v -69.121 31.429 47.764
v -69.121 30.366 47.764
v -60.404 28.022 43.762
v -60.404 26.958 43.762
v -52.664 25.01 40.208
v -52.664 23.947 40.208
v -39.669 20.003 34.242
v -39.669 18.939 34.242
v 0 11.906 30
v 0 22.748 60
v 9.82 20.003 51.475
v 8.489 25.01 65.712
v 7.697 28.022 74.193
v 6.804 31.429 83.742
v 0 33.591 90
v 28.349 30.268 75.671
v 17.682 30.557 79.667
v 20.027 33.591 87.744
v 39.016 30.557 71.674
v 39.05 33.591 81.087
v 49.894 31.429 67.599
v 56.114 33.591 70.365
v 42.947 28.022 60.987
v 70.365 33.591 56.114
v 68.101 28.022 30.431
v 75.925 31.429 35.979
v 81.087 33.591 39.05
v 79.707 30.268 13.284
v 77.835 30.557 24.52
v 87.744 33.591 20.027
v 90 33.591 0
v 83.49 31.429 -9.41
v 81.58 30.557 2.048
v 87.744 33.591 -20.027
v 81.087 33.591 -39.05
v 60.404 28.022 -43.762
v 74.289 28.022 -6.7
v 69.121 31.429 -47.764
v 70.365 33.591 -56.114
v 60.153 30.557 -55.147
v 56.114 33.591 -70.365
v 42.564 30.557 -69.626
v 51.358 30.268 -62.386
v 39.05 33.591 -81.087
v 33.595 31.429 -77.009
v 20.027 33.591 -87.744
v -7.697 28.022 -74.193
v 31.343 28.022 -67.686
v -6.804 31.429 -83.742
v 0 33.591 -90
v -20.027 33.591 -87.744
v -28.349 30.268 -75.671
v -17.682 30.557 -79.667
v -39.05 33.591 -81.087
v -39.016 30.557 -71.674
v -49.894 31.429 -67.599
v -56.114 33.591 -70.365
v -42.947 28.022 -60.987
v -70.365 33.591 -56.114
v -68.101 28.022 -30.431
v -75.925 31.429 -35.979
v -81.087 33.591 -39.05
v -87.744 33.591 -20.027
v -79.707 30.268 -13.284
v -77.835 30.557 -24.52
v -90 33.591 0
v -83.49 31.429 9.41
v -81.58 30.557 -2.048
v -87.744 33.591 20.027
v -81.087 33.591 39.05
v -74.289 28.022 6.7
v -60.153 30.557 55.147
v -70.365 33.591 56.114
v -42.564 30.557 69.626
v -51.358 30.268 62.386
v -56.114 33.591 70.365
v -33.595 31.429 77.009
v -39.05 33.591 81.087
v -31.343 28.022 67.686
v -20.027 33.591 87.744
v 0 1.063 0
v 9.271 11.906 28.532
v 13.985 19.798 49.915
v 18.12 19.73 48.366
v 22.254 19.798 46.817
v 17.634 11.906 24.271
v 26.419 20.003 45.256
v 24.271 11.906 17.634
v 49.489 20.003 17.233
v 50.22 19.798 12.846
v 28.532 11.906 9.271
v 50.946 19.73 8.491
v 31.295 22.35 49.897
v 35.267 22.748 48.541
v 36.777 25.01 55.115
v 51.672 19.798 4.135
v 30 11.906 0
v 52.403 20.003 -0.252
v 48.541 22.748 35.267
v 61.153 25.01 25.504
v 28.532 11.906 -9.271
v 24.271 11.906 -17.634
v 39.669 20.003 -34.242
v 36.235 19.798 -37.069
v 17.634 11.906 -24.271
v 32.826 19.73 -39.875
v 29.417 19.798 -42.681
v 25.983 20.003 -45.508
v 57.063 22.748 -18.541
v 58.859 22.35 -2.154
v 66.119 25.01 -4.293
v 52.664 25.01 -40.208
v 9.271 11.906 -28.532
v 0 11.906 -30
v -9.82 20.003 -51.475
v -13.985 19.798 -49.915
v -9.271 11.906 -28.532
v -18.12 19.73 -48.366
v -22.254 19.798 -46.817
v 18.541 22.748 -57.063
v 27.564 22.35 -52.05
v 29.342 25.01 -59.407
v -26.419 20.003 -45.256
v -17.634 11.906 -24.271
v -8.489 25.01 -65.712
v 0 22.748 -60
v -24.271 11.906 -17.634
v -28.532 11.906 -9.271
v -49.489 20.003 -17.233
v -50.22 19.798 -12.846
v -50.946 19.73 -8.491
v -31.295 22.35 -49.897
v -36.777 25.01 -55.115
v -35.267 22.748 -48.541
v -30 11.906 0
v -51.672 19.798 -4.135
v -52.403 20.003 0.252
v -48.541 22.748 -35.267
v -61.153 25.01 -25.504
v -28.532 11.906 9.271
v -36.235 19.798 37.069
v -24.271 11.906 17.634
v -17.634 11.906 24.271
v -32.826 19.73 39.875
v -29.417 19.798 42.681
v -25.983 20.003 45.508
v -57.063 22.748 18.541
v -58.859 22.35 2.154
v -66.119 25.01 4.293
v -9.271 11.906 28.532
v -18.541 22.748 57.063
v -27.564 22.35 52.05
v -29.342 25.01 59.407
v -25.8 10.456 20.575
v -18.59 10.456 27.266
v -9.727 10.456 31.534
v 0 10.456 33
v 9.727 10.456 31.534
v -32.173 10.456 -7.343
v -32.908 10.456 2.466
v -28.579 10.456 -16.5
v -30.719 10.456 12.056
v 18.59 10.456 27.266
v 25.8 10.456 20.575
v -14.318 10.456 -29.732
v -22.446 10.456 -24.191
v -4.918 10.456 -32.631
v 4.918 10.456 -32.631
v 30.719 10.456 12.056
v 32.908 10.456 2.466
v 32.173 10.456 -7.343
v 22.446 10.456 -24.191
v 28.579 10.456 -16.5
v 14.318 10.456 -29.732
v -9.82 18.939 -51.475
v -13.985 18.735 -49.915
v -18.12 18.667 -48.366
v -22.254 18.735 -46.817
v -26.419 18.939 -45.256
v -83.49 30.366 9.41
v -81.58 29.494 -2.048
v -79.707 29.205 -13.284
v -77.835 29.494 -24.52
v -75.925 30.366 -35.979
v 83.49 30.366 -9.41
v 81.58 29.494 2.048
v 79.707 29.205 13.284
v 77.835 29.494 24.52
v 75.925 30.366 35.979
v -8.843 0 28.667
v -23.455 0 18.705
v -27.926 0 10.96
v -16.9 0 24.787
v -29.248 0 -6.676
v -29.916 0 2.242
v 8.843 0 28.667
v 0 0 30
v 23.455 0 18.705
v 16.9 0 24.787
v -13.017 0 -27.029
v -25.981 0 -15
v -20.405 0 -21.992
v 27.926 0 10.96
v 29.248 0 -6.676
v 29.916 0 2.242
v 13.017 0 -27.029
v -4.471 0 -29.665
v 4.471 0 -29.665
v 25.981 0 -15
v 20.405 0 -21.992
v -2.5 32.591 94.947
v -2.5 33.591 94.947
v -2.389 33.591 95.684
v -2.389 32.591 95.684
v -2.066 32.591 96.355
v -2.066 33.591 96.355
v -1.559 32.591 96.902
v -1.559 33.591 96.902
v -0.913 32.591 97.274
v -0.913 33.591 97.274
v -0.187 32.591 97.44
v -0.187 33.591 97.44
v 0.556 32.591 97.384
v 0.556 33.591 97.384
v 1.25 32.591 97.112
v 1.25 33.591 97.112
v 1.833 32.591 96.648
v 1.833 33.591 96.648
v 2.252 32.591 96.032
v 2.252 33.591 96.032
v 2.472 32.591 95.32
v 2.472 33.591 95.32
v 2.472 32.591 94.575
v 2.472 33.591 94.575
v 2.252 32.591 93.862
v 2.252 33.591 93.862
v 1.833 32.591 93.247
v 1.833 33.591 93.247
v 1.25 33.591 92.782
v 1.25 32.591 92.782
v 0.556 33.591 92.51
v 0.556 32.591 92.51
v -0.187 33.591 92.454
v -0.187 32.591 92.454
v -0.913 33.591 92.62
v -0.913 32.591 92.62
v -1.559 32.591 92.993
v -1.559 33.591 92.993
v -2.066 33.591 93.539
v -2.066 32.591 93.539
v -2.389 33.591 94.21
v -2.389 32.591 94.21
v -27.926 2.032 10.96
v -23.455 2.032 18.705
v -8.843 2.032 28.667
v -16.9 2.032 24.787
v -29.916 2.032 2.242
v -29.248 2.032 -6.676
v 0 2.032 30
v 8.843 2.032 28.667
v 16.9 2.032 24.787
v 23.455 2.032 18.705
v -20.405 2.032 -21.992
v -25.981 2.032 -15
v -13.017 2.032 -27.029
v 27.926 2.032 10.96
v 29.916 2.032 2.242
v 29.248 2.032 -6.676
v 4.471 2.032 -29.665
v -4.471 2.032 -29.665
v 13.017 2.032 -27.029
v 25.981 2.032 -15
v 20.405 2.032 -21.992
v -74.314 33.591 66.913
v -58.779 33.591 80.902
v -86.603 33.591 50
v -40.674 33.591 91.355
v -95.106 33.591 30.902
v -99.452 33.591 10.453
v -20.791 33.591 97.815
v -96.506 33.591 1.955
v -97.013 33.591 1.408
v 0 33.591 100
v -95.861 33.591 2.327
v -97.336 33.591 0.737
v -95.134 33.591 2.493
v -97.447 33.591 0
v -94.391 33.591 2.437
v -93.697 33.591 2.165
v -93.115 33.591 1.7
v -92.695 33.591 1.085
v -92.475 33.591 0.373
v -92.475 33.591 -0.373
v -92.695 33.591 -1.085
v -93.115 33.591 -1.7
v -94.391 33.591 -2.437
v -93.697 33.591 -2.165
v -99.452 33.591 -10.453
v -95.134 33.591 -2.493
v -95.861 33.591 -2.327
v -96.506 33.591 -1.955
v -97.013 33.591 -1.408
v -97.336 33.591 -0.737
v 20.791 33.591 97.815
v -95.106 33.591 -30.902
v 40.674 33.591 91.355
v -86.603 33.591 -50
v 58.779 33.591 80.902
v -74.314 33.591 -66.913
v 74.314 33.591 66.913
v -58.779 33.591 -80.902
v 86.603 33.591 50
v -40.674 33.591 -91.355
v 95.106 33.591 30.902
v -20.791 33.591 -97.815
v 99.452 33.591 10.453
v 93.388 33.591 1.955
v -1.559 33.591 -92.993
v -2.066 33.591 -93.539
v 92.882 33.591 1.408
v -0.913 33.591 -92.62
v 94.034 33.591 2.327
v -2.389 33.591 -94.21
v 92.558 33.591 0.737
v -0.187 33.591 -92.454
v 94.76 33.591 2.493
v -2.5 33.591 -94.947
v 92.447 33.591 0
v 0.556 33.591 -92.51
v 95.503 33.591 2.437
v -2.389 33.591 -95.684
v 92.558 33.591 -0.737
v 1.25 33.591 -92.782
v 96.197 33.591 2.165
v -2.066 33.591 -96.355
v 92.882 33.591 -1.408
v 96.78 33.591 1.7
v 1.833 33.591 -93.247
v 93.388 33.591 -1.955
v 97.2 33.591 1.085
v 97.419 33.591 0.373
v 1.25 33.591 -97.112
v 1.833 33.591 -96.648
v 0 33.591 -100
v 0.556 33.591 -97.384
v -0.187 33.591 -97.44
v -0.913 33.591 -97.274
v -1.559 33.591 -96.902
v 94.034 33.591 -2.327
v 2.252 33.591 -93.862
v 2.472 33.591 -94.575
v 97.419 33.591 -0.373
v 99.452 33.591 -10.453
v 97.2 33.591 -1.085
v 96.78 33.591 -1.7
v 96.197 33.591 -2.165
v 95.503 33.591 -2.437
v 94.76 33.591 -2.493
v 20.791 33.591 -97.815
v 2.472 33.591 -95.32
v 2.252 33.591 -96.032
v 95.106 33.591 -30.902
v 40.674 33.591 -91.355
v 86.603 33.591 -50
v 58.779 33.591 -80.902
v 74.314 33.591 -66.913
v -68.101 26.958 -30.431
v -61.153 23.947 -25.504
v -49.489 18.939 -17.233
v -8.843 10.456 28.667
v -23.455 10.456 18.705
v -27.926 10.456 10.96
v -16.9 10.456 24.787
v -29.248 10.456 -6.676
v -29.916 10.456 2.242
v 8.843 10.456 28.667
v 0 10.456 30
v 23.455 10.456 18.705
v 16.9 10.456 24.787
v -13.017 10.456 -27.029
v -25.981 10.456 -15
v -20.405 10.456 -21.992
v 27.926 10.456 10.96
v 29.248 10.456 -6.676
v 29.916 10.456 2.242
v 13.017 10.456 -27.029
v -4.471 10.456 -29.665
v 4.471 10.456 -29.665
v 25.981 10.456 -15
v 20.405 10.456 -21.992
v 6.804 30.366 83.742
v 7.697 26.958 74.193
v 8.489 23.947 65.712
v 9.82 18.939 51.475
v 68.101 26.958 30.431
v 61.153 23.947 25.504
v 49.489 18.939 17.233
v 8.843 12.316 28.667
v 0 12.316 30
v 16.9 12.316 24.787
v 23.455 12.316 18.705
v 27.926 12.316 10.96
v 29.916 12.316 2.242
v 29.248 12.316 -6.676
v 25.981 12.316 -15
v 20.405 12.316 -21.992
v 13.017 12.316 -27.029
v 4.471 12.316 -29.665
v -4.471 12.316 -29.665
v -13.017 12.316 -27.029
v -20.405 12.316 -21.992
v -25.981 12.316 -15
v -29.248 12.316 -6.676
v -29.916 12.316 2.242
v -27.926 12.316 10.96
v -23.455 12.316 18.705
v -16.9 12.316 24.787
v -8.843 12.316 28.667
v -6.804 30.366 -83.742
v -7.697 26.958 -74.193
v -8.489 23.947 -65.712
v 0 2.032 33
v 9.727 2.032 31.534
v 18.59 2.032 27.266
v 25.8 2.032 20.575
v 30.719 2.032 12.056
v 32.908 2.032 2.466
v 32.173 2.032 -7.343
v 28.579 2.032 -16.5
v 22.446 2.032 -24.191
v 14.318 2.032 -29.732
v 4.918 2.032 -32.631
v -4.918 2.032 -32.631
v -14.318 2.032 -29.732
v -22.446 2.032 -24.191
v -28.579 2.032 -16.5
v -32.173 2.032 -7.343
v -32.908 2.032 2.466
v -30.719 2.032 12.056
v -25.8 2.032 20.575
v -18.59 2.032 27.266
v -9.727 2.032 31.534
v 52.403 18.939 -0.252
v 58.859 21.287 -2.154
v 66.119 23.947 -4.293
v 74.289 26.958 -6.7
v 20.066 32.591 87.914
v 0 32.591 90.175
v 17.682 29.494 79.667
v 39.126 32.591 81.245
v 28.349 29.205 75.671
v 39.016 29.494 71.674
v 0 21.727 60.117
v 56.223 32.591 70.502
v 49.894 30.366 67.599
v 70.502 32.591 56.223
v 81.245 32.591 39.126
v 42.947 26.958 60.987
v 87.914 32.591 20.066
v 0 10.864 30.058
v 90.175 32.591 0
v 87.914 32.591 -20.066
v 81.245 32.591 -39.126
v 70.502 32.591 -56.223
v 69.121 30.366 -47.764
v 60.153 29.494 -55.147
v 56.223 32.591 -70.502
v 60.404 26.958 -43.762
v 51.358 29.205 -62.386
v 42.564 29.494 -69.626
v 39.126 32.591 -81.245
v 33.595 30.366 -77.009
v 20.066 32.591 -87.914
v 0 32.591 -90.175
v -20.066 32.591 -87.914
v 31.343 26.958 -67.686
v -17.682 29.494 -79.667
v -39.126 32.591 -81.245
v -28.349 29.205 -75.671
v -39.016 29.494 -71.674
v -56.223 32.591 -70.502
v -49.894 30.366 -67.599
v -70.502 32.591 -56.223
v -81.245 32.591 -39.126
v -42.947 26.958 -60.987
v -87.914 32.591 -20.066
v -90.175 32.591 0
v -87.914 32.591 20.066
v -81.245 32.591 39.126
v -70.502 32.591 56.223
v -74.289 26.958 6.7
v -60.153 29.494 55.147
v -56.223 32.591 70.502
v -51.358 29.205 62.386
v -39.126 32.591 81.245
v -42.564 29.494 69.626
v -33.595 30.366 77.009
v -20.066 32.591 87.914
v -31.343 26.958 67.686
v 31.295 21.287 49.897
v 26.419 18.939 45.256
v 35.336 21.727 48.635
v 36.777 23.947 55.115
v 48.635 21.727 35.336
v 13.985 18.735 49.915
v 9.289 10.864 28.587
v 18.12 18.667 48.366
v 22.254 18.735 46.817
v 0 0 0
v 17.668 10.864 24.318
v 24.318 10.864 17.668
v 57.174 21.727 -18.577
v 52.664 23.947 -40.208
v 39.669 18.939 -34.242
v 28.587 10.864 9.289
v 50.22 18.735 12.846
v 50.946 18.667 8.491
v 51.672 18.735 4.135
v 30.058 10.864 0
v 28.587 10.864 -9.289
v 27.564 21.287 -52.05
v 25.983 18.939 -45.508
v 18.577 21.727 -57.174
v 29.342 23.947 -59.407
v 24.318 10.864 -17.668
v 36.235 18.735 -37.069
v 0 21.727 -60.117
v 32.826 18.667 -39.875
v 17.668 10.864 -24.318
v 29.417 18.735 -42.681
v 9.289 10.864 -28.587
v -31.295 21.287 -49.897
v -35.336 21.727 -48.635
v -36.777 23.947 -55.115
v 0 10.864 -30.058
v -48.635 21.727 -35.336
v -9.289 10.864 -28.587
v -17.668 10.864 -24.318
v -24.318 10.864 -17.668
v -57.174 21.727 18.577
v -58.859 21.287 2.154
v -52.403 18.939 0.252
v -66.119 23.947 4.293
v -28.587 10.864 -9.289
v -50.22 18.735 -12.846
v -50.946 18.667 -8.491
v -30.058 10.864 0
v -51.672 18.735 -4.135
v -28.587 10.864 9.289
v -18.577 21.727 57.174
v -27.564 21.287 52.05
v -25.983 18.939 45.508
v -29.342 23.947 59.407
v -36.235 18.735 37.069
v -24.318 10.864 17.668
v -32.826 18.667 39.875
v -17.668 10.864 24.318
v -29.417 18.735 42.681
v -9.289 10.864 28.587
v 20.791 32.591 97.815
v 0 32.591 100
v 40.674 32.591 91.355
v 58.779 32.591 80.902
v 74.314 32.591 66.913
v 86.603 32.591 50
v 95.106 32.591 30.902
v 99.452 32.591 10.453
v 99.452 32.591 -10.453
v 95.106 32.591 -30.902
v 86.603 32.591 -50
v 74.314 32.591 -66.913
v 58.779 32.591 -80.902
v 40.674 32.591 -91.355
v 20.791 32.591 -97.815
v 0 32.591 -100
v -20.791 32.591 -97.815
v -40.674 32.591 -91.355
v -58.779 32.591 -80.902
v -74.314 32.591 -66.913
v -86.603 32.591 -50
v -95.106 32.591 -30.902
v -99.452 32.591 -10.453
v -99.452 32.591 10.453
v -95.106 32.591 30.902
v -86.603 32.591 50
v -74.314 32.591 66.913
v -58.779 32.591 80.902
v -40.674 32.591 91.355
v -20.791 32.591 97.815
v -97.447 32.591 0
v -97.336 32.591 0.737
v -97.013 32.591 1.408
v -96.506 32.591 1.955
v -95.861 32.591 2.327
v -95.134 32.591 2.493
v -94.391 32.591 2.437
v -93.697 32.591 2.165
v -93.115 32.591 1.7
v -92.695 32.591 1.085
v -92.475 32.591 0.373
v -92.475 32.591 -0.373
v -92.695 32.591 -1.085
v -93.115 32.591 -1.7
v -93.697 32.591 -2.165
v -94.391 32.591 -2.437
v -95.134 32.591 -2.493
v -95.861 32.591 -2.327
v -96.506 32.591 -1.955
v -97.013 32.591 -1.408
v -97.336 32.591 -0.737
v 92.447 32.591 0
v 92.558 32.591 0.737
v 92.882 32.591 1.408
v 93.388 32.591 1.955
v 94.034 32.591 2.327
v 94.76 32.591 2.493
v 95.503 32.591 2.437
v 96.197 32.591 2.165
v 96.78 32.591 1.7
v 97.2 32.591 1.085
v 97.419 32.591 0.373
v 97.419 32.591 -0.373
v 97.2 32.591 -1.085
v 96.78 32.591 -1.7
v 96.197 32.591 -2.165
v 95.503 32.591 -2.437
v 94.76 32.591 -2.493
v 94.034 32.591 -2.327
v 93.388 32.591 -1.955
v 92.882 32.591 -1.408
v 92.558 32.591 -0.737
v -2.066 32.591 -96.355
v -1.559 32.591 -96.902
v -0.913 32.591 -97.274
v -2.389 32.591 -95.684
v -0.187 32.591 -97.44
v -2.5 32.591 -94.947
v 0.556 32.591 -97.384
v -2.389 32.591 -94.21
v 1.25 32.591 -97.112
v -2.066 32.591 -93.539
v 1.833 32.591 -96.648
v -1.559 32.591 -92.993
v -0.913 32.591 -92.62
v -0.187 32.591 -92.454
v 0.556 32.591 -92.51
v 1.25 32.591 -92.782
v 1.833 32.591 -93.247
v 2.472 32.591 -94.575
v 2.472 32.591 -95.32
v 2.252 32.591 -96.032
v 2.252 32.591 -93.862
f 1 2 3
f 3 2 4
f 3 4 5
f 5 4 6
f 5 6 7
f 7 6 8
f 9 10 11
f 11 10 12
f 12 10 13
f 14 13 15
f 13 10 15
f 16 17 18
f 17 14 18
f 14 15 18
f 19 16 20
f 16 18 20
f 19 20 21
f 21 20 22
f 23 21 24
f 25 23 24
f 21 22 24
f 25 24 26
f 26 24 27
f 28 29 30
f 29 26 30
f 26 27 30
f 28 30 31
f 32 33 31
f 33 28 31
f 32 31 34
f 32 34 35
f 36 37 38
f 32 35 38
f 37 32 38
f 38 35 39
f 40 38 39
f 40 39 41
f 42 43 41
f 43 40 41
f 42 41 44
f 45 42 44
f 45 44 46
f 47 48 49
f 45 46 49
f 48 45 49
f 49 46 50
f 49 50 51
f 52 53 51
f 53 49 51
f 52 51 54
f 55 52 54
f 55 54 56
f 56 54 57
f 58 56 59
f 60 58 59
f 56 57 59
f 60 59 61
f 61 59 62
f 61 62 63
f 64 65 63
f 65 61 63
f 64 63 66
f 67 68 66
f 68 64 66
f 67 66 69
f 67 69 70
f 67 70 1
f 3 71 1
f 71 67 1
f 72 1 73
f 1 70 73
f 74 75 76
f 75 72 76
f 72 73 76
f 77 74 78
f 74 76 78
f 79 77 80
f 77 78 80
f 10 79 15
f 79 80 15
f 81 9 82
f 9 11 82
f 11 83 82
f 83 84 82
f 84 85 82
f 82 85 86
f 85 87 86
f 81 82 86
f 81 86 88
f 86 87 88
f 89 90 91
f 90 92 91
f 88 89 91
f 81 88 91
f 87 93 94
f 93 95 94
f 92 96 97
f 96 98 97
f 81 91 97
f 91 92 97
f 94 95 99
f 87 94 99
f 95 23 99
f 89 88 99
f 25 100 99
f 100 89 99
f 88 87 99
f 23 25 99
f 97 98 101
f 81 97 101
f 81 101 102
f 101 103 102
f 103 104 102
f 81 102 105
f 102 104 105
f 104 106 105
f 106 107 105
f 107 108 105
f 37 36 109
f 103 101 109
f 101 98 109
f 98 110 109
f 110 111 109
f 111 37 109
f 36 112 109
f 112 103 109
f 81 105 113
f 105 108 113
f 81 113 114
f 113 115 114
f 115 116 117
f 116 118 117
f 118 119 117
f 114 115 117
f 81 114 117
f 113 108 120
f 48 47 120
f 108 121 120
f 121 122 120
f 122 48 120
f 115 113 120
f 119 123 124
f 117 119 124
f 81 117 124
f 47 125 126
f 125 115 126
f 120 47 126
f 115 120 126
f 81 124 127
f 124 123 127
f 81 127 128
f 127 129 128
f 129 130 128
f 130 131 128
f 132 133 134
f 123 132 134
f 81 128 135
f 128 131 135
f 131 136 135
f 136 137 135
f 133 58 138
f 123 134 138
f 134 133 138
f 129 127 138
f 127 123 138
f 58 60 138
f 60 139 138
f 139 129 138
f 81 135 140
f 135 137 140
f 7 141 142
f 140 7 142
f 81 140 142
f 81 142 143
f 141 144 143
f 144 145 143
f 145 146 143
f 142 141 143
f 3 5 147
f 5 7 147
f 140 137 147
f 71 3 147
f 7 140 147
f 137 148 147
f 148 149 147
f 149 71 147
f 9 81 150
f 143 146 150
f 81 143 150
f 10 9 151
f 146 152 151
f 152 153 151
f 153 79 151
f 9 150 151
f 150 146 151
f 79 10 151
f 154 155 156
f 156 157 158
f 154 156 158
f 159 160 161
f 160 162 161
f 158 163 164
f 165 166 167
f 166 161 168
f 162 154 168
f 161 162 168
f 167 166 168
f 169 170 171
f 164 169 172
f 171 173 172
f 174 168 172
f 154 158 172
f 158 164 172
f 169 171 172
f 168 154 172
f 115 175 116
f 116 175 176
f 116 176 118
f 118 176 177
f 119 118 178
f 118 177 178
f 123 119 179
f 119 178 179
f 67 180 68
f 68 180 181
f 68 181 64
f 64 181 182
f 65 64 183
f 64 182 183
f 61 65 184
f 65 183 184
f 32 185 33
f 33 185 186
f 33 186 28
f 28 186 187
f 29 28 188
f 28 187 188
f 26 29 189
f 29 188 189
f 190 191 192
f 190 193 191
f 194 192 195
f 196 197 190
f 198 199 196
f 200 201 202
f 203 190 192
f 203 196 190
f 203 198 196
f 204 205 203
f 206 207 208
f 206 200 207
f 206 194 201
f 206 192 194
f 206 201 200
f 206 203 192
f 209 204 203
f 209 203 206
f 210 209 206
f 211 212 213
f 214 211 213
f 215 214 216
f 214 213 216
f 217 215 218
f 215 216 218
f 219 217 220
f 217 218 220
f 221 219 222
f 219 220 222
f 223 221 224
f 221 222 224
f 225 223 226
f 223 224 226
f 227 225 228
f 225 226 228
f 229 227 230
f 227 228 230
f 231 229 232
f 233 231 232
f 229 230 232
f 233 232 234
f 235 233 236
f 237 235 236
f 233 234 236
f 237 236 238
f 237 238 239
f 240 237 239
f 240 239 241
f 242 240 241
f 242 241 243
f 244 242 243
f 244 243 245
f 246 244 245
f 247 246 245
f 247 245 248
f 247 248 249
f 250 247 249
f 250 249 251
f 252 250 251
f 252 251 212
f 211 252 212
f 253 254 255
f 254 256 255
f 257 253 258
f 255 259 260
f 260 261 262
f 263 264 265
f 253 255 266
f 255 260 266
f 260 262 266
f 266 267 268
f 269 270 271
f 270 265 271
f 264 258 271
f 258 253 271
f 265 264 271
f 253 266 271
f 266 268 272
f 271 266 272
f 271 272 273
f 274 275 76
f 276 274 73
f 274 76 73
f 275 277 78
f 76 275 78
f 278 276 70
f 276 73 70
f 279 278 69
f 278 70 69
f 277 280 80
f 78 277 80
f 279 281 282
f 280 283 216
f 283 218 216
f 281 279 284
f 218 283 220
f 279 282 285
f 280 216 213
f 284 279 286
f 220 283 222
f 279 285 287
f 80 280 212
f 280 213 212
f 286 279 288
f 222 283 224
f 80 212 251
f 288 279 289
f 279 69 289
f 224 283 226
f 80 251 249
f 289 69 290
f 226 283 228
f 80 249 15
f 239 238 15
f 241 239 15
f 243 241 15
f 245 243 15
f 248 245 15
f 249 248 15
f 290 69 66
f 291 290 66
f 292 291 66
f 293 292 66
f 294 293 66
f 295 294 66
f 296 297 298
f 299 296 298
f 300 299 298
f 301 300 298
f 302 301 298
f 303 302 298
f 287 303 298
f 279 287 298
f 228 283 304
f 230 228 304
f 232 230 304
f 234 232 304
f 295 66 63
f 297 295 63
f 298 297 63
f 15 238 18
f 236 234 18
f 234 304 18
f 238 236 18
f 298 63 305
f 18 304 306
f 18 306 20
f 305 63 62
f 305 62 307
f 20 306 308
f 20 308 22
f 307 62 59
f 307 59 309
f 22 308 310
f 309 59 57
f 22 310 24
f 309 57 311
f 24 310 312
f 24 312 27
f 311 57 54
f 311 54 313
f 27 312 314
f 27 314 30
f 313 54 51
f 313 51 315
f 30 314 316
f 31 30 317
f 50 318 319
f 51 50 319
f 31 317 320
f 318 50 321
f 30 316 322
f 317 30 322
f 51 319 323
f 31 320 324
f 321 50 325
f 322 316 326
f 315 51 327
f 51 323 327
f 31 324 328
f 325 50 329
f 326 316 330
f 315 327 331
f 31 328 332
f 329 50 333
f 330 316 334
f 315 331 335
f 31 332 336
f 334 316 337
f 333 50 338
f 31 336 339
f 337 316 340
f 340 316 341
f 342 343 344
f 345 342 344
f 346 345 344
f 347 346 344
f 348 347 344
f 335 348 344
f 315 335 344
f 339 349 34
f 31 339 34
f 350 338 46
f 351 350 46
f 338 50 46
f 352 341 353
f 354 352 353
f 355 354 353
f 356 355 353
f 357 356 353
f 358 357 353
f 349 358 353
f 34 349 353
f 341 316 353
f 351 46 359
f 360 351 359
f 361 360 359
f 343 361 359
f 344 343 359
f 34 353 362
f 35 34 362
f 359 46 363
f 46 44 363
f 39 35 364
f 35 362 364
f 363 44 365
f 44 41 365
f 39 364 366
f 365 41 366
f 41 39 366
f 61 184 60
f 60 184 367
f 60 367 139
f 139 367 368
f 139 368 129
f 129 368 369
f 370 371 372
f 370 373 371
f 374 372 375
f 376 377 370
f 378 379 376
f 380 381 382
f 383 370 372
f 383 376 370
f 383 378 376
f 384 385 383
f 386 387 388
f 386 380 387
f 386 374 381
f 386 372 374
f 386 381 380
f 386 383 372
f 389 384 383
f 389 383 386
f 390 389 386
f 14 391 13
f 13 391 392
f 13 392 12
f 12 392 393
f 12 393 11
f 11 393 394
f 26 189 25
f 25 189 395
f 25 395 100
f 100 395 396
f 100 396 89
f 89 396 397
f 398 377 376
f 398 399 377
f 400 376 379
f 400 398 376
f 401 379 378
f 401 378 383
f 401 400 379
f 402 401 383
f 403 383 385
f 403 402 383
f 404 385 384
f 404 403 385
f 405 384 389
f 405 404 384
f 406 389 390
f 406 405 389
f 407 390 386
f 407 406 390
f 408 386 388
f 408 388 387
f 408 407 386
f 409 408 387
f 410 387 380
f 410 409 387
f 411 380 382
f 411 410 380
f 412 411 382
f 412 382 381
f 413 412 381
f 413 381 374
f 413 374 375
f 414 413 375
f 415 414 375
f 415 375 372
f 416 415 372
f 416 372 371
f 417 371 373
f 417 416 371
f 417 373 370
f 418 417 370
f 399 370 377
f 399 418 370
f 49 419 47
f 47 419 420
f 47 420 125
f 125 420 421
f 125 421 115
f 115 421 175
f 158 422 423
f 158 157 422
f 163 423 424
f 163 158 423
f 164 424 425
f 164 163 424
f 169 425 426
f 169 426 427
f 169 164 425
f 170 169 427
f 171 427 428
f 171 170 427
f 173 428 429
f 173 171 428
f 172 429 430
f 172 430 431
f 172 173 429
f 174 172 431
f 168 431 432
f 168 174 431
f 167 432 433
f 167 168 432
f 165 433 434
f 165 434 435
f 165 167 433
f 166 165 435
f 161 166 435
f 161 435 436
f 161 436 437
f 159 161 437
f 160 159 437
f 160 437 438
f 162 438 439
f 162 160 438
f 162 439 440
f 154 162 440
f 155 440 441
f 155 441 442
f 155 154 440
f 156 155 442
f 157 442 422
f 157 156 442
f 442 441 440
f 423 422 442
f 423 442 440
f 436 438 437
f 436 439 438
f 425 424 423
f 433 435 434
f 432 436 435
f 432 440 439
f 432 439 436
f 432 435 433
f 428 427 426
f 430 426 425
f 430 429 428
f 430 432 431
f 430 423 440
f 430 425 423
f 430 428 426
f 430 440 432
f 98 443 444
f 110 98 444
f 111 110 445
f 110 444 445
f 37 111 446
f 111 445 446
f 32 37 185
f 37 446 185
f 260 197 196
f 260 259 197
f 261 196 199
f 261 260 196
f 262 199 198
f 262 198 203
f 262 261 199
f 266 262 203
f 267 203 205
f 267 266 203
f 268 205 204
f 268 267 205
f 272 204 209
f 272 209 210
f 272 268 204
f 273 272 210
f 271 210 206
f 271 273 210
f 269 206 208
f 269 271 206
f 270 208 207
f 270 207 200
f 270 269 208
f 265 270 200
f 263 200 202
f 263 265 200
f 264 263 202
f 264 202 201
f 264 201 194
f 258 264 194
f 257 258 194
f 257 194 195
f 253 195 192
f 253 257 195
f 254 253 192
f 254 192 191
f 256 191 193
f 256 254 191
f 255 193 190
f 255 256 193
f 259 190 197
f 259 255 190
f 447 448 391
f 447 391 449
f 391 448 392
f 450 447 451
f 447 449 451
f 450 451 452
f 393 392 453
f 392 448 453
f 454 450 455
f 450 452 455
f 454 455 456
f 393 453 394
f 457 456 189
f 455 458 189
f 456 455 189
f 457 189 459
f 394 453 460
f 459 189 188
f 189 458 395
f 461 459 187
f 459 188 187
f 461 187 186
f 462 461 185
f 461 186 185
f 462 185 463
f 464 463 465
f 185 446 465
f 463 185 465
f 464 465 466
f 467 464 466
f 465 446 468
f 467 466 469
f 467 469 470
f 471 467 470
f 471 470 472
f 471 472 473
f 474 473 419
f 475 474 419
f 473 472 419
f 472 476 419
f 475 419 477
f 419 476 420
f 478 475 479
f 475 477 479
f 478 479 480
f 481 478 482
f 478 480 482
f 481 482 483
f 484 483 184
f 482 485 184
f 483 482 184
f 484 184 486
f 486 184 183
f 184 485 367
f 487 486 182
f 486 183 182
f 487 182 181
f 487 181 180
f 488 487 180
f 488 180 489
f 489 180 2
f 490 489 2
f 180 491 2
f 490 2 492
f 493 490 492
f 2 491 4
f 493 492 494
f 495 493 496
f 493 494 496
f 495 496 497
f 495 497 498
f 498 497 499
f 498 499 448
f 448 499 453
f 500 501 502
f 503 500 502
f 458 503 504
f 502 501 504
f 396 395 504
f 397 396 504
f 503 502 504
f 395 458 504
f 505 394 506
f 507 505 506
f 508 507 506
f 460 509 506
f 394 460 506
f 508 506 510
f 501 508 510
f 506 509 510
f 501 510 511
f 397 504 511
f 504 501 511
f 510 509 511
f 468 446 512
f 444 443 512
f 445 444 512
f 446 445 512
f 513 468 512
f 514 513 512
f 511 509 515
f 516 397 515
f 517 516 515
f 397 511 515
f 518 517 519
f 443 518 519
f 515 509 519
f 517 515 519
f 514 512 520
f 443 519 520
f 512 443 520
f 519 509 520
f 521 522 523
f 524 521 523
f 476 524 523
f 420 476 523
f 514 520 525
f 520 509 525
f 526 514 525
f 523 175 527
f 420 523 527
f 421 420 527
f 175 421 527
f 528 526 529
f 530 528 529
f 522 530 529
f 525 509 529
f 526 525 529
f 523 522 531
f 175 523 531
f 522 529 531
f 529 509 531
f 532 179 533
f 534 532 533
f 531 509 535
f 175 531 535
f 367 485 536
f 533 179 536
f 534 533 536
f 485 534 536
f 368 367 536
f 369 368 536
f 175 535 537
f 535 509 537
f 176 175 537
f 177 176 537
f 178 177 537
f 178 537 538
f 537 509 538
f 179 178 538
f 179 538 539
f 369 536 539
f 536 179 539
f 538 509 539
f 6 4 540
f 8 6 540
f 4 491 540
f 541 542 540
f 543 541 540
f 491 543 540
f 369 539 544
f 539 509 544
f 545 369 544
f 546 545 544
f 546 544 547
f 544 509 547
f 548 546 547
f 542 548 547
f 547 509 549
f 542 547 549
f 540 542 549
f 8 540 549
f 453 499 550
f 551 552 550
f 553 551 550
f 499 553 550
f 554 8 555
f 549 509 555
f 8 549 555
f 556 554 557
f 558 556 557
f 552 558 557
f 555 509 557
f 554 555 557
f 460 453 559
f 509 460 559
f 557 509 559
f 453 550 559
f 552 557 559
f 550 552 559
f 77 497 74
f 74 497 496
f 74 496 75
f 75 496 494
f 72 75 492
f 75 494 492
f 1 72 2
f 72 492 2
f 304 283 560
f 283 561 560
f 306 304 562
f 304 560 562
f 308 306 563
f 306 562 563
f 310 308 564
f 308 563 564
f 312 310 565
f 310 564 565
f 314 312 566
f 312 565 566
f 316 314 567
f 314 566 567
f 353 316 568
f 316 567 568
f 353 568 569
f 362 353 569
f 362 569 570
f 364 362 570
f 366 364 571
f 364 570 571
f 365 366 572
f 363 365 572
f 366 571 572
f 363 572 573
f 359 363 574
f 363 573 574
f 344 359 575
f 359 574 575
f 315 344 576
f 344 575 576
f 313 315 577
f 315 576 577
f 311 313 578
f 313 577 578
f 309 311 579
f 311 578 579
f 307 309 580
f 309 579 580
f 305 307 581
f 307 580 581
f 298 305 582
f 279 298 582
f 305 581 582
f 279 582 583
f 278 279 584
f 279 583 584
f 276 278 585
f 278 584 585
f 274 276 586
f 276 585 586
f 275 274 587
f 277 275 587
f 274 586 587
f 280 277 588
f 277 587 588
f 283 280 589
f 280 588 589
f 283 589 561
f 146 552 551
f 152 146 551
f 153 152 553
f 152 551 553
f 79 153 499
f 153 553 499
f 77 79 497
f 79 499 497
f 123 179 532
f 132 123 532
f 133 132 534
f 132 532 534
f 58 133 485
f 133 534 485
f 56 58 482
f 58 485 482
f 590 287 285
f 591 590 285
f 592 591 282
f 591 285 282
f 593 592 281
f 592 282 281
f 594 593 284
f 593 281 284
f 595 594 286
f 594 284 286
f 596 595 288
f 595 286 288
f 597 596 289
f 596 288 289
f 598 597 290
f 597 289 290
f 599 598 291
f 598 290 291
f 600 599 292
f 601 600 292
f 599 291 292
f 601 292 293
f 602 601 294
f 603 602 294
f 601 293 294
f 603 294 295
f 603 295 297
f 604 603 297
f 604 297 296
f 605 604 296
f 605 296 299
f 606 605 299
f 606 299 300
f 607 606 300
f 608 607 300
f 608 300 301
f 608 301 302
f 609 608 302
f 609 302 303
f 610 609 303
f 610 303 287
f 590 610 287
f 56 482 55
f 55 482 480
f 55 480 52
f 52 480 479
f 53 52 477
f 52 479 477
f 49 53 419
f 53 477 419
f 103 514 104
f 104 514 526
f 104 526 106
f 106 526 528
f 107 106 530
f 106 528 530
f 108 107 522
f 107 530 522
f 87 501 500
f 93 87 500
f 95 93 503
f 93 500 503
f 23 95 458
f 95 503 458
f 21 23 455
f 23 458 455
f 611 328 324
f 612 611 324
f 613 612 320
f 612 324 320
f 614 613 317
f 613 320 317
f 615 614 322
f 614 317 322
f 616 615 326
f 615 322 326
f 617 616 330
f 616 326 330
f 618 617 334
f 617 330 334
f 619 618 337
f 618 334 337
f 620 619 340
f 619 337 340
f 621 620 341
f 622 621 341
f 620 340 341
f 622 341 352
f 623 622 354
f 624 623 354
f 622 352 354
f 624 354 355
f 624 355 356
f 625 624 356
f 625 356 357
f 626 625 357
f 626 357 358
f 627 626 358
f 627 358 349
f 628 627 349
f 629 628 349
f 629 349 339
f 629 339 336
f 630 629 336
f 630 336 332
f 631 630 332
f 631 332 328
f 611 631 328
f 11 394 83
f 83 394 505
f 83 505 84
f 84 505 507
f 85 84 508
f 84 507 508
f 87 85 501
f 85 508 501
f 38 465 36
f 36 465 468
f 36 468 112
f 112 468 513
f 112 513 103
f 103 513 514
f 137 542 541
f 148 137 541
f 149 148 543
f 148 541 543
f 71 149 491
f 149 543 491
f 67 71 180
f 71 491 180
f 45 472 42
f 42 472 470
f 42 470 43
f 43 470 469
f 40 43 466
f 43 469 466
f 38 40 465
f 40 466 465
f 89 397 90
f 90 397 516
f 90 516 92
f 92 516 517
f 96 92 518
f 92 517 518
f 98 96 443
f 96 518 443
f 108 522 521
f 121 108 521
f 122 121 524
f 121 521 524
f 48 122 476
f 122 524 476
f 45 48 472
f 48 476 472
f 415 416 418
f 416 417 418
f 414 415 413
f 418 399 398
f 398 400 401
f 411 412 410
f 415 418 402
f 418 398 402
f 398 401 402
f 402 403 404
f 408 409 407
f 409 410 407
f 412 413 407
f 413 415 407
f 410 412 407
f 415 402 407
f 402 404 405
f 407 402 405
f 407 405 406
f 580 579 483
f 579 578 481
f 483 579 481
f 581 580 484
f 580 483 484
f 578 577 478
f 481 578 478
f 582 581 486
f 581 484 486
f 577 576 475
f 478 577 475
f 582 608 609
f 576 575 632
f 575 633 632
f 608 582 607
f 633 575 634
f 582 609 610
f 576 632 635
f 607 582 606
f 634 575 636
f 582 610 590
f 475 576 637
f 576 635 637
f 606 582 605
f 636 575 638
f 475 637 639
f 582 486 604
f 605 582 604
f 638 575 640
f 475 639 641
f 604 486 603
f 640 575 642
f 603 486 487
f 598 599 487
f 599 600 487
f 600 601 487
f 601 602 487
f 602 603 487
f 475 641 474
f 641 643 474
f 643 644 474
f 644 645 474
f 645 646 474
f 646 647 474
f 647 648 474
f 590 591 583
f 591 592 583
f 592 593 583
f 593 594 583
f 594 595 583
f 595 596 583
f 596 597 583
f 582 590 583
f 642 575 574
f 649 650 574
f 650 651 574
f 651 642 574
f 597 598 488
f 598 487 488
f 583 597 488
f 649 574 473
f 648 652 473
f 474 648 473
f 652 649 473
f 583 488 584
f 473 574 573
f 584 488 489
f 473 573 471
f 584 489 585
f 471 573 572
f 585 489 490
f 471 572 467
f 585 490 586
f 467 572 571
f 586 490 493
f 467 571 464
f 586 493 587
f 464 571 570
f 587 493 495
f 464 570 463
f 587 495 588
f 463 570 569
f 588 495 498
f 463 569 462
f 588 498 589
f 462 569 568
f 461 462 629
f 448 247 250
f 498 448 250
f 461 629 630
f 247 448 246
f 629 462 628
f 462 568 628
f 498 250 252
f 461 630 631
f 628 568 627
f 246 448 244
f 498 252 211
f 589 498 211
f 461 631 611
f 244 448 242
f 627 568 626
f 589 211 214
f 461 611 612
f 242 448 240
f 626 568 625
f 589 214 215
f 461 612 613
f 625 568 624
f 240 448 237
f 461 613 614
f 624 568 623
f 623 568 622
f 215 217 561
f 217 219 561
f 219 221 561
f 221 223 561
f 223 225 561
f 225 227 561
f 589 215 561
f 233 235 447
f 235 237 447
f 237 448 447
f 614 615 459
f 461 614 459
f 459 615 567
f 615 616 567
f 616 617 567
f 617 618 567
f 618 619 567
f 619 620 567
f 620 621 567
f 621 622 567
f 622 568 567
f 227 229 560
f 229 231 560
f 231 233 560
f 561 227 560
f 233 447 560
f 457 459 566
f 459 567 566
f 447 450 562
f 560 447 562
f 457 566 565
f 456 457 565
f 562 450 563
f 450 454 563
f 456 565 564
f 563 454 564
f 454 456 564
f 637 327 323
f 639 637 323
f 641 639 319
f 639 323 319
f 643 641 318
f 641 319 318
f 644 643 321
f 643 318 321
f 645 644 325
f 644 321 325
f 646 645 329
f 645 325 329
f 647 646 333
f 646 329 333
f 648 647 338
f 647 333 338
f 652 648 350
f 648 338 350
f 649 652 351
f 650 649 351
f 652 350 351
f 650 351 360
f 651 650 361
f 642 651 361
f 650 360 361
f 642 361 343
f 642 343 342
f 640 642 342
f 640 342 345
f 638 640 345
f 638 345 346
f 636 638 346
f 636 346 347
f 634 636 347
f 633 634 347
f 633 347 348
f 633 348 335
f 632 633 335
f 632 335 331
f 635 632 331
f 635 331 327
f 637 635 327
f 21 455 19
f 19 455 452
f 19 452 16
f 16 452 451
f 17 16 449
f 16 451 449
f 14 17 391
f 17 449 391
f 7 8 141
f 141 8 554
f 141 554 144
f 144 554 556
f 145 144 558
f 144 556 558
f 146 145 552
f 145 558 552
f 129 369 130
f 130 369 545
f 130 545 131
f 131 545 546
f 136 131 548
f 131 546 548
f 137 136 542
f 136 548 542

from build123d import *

# Parameters (mm, degrees)
F0_W          = 2.0318743463
F0_H          = 30
F0_W_2        = 1.8593237499
F2_W          = 8.4245346444
F2_H          = 33
F9_DEPTH      = 135
F9_DEPTH_BACK = 304
F10_COUNT     = 6
F12_R         = 2.5
F13_DEPTH     = 33.5917390977


# Not quite as in the source:
# - the program builds the solid bodies; features that only make, move or delete a surface that nothing else refers to are left out


with BuildPart() as f1:
    # F0 (on Right) → F1 (revolve)
    with BuildSketch(Plane.YZ):
        with Locations((1.0159371731, 15)):
            Rectangle(F0_W, F0_H)
    revolve(axis=Axis((0, 1.0159371731, 0), (0, 1, 0)))


with BuildPart() as f1b:
    # F0 (on Right) → F1, piece 2 (revolve)
    with BuildSketch(Plane.YZ):
        with Locations((11.3860708656, 15)):
            Rectangle(F0_W_2, F0_H)
    revolve(axis=Axis((0, 1.0159371731, 0), (0, 1, 0)))


with BuildPart() as f3:
    # F2 (on Right) → F3 (revolve)
    with BuildSketch(Plane.YZ):
        with Locations((6.2441416685, 16.5)):
            Rectangle(F2_W, F2_H)
    revolve(axis=Axis((0, 6.2441416685, 0), (0, 1, 0)))


with BuildPart() as f7:
    # F6 (on Right) → F7 (revolve)
    with BuildSketch(Plane.YZ):
        Polygon((0, 0), (1.0633068526, 0), (33.5907390977, 90), (33.5907390977, 100), (32.5907390977, 100), (32.5907390977, 90.1751634341), align=None)
    revolve(axis=Axis((0, 47.4777109921, 0), (0, 1, 0)))


with BuildPart() as f9:
    # F8 (on Front) → F9 (new body, two sides)
    with BuildSketch(Plane.XZ) as f9_sk:
        Polygon((-33.5954686136, 77.0091775446), (-69.1209128956, 47.7636717384), (-39.6688894061, 34.2418646839), (-25.9834363433, 45.5080994937), align=None)
    extrude(amount=F9_DEPTH)
    extrude(f9_sk.sketch, amount=-F9_DEPTH_BACK)


with BuildPart() as f10_1:
    # F10: instance of F9
    add(f9.part.rotate(Axis((0, 11.3860708656, 0), (0, 1, 0)), 1 * 360 / F10_COUNT))


with BuildPart() as f10_2:
    # F10: instance of F9
    add(f9.part.rotate(Axis((0, 11.3860708656, 0), (0, 1, 0)), 2 * 360 / F10_COUNT))


with BuildPart() as f10_3:
    # F10: instance of F9
    add(f9.part.rotate(Axis((0, 11.3860708656, 0), (0, 1, 0)), 3 * 360 / F10_COUNT))


with BuildPart() as f10_4:
    # F10: instance of F9
    add(f9.part.rotate(Axis((0, 11.3860708656, 0), (0, 1, 0)), 4 * 360 / F10_COUNT))


with BuildPart() as f10_5:
    # F10: instance of F9
    add(f9.part.rotate(Axis((0, 11.3860708656, 0), (0, 1, 0)), 5 * 360 / F10_COUNT))


with BuildPart() as f7_1:
    add(f7.part)

    # F11: cut F10_1, F9, F10_5, F10_4, F10_3, F10_2
    add(f10_1.part, mode=Mode.SUBTRACT)
    add(f9.part, mode=Mode.SUBTRACT)
    add(f10_5.part, mode=Mode.SUBTRACT)
    add(f10_4.part, mode=Mode.SUBTRACT)
    add(f10_3.part, mode=Mode.SUBTRACT)
    add(f10_2.part, mode=Mode.SUBTRACT)

    # F12 (on face) → F13 (cut, through all)
    with BuildSketch(Plane(origin=(0, 33.5907390977, 0), x_dir=(-1, 0, 0), z_dir=(0, 1, 0))):
        with Locations((94.9471559662, 0)):
            Circle(F12_R)
        with Locations((-94.9471559662, 0)):
            Circle(F12_R)
        with Locations((0, -94.9471559662)):
            Circle(F12_R)
        with Locations((0, 94.9471559662)):
            Circle(F12_R)
    extrude(amount=-F13_DEPTH, mode=Mode.SUBTRACT)


solid = Compound([f1.part, f1b.part, f3.part, f7_1.part])
